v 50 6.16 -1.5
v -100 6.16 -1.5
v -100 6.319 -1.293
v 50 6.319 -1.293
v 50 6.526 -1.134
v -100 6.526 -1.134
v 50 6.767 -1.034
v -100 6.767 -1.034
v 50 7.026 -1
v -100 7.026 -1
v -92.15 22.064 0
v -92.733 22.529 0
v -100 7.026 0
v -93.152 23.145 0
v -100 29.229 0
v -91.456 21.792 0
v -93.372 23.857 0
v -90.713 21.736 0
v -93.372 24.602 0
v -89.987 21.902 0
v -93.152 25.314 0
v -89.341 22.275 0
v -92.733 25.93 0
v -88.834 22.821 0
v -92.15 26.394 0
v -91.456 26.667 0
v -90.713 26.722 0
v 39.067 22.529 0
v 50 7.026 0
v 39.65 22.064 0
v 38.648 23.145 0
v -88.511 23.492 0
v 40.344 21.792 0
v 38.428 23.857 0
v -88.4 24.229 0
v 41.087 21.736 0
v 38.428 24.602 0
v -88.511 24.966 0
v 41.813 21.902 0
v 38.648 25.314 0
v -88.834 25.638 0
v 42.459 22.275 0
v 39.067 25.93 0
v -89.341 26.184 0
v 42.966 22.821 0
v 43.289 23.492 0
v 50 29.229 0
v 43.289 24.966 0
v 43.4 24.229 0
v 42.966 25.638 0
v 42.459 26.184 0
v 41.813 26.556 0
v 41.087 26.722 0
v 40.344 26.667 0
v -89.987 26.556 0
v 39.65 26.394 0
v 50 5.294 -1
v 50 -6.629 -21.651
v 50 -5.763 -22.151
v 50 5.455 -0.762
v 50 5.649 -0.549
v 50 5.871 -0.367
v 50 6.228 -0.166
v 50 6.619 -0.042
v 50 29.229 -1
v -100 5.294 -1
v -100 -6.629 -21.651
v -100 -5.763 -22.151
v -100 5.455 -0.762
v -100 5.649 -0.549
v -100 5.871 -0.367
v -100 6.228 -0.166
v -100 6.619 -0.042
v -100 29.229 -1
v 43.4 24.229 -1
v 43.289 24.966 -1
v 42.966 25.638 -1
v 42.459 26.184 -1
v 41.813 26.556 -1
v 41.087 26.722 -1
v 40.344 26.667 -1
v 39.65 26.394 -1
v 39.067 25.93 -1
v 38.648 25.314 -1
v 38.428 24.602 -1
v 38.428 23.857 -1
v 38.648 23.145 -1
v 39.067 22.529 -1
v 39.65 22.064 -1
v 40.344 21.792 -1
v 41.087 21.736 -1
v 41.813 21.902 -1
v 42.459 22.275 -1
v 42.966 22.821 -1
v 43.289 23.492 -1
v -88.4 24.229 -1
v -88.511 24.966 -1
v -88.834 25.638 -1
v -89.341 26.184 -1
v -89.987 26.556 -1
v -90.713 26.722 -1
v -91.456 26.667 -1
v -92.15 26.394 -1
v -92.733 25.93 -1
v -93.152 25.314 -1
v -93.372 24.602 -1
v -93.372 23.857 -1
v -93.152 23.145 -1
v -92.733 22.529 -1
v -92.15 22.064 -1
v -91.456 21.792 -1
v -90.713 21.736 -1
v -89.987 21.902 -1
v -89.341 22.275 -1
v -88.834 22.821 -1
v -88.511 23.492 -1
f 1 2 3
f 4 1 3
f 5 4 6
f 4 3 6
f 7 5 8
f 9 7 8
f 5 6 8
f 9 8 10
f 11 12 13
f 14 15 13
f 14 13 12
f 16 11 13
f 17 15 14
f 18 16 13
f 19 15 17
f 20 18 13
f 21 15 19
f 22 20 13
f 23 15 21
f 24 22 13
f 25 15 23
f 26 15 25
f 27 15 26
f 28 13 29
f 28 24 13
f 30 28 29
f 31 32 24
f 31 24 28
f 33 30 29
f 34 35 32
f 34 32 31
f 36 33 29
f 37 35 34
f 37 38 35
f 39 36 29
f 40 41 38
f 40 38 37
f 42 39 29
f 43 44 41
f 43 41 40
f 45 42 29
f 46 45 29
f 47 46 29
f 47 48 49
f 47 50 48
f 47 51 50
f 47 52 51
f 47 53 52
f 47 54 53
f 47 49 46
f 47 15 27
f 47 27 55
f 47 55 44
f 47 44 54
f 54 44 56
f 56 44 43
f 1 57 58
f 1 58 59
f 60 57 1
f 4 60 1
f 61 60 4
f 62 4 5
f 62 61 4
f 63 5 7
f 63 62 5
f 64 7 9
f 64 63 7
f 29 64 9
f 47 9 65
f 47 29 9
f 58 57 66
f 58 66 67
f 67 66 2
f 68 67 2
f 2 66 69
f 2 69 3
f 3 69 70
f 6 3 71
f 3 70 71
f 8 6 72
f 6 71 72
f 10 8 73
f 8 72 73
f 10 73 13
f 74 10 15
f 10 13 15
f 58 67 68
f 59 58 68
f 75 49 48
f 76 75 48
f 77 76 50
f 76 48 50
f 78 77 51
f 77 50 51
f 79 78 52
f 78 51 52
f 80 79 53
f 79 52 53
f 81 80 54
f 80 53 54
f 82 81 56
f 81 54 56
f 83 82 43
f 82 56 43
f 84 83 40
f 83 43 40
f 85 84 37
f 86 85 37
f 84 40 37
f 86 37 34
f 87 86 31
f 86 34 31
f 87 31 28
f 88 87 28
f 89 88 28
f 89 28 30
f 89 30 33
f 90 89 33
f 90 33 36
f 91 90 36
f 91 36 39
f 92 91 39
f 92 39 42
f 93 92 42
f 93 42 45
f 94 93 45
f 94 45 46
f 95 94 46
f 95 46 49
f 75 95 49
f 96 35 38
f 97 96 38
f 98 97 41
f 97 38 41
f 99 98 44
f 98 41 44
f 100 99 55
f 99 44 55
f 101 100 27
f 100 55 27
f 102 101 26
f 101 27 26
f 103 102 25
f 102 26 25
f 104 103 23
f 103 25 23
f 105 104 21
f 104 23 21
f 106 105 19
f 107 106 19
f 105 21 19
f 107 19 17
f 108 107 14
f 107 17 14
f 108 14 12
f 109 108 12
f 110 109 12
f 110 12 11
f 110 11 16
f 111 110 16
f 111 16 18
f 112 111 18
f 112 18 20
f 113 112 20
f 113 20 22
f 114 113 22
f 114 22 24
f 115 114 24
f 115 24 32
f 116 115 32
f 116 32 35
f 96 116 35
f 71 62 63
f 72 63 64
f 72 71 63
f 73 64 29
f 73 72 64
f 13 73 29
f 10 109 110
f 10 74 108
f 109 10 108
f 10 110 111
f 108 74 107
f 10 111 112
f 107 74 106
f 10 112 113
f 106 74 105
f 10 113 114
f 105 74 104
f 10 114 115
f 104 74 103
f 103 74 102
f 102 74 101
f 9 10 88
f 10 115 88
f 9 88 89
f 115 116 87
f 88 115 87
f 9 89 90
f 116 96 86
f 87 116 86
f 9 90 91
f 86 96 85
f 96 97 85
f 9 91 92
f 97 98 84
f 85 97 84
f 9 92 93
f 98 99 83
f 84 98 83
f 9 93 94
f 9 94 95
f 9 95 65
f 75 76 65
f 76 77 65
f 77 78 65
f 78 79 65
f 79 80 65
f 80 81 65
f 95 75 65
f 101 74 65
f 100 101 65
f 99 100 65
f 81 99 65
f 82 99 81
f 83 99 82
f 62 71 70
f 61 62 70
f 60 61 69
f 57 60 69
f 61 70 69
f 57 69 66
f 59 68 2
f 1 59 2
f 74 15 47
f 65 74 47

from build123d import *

# Parameters (mm, degrees)
SKETCH1_W            = 150
SKETCH1_H            = 23.35790613
BASE_FLANGE1_DEPTH   = 1
EDGE_FLANGE2_START   = -100
EDGE_FLANGE2_DEPTH   = 150
EDGE_FLANGE2_2_DEPTH = 150
SKETCH13_R           = 2.5
CUT_EXTRUDE1_DEPTH   = 3


# Read off the part's stored shape, not the designer's step: Edge-Flange2
# Sheet-metal steps are written as plain solids
with BuildPart() as part:
    # Sketch1 → Base-Flange1 (new body)
    with BuildSketch(Plane.XY):
        with Locations((-25, 17.550273337)):
            Rectangle(SKETCH1_W, SKETCH1_H)
    extrude(amount=-BASE_FLANGE1_DEPTH)

    # Edge-Flange2 outline → Edge-Flange2 (cut)
    with BuildSketch(Plane.YZ.offset(EDGE_FLANGE2_START)):
        with BuildLine():
            Line((5.871320272, 0), (5.871320272, -0.367006837))
            ThreePointArc((5.871320272, -0.367006837), (6.420209917, -0.093958772), (7.02602081, 0))
            Line((7.02602081, 0), (5.871320272, 0))
        make_face()
    extrude(amount=EDGE_FLANGE2_DEPTH, mode=Mode.SUBTRACT)

    # Edge-Flange2 2 outline → Edge-Flange2 2 (add)
    with BuildSketch(Plane.YZ.offset(EDGE_FLANGE2_START)):
        with BuildLine():
            ThreePointArc((5.871320272, -0.367006837), (5.548352573, -0.652225322), (5.293970003, -1))
            Line((5.293970003, -1), (-6.628679728, -21.650635095))
            Line((-6.628679728, -21.650635095), (-5.762654324, -22.150635095))
            Line((-5.762654324, -22.150635095), (6.159995406, -1.5))
            ThreePointArc((6.159995406, -1.5), (6.52602081, -1.133974596), (7.02602081, -1))
            Line((7.02602081, -1), (5.871320272, -1))
            Line((5.871320272, -1), (5.871320272, -0.367006837))
        make_face()
    extrude(amount=EDGE_FLANGE2_2_DEPTH)

    # Sketch13 → Cut-Extrude1 (cut)
    with BuildSketch(Plane.XY):
        with Locations((40.9, 24.229226402)):
            Circle(SKETCH13_R)
        with Locations((-90.9, 24.229226402)):
            Circle(SKETCH13_R)
    extrude(amount=-CUT_EXTRUDE1_DEPTH, mode=Mode.SUBTRACT)


solid = part.part
